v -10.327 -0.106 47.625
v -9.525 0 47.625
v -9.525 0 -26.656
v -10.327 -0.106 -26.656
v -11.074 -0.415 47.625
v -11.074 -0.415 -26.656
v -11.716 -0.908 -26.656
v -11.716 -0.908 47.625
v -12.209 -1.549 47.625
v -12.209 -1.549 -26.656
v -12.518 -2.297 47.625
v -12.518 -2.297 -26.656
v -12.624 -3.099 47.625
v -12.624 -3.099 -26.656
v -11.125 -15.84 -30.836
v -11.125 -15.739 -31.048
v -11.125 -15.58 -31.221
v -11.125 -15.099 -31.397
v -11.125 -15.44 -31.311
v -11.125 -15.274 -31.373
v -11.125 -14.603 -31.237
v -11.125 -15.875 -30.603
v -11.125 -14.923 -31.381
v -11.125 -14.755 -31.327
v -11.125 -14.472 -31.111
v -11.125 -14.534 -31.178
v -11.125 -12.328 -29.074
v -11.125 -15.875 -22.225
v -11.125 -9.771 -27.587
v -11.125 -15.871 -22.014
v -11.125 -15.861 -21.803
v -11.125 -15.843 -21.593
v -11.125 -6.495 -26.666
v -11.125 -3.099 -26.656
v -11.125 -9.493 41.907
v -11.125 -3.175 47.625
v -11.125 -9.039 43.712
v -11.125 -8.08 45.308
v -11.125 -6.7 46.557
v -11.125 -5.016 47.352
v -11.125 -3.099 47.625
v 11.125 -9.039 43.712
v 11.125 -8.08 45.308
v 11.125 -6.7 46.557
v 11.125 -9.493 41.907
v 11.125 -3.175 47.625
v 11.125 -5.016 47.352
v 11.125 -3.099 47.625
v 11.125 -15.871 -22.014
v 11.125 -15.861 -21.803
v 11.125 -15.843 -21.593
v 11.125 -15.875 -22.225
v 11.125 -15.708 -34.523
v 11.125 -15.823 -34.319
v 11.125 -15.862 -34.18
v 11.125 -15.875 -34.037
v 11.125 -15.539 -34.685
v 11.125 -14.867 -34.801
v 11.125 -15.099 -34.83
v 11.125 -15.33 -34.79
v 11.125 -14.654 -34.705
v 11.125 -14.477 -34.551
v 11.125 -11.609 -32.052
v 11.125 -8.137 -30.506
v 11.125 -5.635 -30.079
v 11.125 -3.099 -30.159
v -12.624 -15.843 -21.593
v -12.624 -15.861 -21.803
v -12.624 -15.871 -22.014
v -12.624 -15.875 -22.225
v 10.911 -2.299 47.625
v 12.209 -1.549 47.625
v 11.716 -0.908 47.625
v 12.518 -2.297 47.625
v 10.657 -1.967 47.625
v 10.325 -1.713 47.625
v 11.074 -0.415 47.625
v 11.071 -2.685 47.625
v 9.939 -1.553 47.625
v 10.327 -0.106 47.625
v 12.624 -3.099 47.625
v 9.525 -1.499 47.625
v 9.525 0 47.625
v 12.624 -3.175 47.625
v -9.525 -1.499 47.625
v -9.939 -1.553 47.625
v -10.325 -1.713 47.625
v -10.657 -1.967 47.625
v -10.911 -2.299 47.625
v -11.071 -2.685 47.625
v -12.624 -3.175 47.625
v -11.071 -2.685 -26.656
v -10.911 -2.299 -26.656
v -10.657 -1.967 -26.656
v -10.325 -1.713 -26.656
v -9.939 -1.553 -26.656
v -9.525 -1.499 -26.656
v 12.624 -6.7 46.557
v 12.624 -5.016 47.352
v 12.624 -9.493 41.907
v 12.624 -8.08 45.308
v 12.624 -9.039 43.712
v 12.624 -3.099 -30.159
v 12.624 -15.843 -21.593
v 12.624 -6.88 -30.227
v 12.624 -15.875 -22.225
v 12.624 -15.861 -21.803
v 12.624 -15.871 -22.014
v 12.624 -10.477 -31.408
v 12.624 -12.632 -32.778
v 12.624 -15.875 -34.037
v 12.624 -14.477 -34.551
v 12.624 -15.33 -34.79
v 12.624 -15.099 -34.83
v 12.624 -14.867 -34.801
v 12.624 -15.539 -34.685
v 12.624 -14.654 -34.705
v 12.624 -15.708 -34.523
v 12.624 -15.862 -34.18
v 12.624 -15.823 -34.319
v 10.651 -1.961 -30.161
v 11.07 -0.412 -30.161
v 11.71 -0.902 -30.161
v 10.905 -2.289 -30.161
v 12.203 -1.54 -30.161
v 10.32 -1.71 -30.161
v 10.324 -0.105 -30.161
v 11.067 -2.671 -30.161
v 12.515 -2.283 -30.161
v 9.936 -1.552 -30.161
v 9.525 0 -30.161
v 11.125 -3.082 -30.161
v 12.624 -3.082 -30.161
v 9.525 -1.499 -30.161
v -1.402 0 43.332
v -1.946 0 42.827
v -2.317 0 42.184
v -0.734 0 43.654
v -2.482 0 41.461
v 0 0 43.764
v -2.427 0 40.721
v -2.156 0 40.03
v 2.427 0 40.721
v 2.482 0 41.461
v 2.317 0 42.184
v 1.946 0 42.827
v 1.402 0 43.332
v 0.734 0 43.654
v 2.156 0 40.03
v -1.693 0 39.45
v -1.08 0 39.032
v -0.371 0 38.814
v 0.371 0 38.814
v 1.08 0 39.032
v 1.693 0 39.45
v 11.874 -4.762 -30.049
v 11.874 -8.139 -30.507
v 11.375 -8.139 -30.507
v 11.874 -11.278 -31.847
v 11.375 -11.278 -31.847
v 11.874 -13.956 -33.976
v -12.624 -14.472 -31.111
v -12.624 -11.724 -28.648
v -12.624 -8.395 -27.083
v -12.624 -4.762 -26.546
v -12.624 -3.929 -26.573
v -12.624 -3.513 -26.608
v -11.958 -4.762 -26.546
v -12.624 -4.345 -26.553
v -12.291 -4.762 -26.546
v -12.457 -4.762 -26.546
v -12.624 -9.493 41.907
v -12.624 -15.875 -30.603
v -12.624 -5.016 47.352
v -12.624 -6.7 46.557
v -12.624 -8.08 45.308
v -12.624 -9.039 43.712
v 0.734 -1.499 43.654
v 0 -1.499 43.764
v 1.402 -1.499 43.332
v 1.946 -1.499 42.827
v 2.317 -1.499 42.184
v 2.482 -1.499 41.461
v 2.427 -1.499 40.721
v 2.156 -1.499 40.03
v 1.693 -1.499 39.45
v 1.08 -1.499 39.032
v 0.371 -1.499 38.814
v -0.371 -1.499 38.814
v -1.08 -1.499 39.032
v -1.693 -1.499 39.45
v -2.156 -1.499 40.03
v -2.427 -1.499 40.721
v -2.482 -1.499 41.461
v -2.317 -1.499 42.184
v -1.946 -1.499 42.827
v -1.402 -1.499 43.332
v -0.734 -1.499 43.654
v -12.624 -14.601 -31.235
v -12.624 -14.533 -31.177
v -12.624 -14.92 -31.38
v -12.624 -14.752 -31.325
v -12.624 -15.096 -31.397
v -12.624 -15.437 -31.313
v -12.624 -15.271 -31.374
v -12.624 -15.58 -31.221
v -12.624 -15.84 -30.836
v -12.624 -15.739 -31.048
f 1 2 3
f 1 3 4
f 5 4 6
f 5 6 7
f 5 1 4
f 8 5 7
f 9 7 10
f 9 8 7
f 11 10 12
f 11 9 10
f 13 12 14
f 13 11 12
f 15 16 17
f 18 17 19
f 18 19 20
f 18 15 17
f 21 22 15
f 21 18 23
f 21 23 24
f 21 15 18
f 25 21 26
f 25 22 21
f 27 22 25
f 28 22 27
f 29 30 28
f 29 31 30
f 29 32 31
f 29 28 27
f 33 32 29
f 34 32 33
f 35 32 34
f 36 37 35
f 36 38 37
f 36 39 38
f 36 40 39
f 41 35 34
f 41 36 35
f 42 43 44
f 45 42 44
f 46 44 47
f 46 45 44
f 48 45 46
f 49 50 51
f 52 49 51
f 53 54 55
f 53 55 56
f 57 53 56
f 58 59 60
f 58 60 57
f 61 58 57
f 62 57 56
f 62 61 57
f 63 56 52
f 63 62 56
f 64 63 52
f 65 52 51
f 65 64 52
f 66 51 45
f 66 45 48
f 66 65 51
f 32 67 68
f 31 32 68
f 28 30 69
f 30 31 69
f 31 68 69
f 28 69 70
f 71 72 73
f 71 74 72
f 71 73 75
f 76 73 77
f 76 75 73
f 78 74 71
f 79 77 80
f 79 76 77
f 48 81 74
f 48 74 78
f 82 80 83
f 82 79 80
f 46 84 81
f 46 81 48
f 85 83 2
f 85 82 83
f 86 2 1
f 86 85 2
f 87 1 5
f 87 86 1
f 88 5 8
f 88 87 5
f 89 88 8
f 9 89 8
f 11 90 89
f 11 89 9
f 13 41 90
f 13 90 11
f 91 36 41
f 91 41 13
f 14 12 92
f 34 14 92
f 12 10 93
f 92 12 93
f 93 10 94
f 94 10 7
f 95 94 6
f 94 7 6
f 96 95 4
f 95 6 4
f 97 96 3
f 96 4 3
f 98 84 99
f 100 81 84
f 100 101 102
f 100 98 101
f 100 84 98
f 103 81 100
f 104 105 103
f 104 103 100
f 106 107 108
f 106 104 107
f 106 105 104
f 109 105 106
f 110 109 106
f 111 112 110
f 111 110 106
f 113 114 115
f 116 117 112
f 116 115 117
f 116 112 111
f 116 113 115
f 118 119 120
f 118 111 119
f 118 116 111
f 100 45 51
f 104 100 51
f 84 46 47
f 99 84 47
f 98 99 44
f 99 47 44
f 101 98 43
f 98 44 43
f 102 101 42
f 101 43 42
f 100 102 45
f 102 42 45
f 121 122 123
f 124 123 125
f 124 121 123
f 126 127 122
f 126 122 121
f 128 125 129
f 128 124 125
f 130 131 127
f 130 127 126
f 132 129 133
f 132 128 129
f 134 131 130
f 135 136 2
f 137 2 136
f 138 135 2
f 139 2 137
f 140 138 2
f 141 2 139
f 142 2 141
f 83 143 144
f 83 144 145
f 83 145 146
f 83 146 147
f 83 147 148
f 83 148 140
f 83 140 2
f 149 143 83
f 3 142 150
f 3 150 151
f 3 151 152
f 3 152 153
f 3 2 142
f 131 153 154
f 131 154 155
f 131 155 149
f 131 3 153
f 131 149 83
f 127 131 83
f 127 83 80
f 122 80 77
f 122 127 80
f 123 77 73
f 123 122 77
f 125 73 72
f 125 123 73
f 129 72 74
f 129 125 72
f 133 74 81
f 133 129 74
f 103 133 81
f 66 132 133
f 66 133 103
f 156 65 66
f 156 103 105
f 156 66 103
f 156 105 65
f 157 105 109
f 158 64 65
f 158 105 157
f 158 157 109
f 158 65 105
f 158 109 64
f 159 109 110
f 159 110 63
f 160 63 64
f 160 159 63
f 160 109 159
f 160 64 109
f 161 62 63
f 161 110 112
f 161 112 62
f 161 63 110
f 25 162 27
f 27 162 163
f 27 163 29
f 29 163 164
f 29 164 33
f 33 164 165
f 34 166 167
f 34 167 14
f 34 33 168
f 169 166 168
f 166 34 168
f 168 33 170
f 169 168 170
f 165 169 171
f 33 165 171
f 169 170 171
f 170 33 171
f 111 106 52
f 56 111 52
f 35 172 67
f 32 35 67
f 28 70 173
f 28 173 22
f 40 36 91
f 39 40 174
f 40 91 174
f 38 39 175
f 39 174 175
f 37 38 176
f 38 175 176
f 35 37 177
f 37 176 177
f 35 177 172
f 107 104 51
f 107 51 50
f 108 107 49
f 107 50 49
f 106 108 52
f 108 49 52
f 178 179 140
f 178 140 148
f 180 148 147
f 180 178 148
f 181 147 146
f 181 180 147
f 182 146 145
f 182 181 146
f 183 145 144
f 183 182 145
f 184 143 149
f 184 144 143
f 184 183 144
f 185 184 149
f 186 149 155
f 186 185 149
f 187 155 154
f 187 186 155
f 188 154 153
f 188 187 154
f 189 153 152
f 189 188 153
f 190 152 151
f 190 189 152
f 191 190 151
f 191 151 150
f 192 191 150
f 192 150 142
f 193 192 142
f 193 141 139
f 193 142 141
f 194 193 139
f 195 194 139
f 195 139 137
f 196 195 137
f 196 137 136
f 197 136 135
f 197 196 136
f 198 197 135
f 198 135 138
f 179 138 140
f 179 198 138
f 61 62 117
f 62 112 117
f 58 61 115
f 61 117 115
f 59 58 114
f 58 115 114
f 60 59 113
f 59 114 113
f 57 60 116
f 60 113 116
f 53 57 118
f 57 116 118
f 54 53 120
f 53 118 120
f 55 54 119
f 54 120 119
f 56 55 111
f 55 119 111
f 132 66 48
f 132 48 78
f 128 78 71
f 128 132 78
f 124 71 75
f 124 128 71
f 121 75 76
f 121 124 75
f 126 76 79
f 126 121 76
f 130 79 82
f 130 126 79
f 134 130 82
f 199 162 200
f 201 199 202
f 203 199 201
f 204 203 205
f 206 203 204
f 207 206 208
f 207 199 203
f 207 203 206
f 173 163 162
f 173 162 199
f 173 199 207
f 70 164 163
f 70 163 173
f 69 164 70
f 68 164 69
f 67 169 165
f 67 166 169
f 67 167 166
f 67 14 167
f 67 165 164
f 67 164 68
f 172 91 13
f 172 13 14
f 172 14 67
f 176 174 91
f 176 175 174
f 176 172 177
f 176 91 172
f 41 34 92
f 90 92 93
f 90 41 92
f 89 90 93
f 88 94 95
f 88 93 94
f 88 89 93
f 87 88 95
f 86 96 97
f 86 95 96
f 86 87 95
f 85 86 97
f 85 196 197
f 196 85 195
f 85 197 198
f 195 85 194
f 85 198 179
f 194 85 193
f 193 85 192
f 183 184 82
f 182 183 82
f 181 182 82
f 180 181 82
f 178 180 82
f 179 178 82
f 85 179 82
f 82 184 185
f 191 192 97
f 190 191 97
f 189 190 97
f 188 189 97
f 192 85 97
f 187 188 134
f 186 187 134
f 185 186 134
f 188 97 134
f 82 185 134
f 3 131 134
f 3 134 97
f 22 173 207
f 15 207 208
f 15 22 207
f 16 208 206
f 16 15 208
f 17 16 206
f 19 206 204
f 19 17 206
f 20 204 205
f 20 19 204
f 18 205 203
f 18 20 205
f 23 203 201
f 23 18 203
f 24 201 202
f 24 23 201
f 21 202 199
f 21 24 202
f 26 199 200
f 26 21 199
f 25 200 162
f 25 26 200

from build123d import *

# Parameters (mm, degrees)
BASE_FLANGE1_START      = -1.4986
BASE_FLANGE1_OUTLINE_W  = 19.05
BASE_FLANGE1_OUTLINE_H  = 95.25
BASE_FLANGE1_DEPTH      = 1.4986
EDGE_FLANGE2_DEPTH      = 95.25
EDGE_FLANGE2_BEND_DEPTH = 95.25
CUT_EXTRUDE2_DEPTH      = 52.76404714123502
CUT_EXTRUDE2_DEPTH_BACK = 52.76404714123502
SKETCH22_R              = 2.4892000000000007
SURFACECUT1_START       = -8.467465696
SURFACECUT1_DEPTH       = 28.142997323
CUT_EXTRUDE5_START      = -7.730915537
CUT_EXTRUDE5_DEPTH      = 7.730915537
CUT_EXTRUDE6_DEPTH      = 3.0988
CUT_EXTRUDE7_DEPTH      = 3.0988
CUT_EXTRUDE3_DEPTH      = 57.19250460256741
FILLET1_R               = 0.79375


# Read off the part's stored shape, not the designer's step: Base-Flange1, SurfaceCut1, Cut-Extrude5
# Sheet-metal steps are written as plain solids
with BuildPart() as part:
    # Base-Flange1 outline → Base-Flange1 (new body)
    with BuildSketch(Plane(origin=(0, 0, 0), x_dir=(1, 0, 0), z_dir=(0, 1, 0)).offset(BASE_FLANGE1_START)):
        Rectangle(BASE_FLANGE1_OUTLINE_W, BASE_FLANGE1_OUTLINE_H)
    extrude(amount=BASE_FLANGE1_DEPTH)

    # Edge-Flange2 section (across the edge) → Edge-Flange2 (add)
    with BuildSketch(Plane(origin=(11.125200000000007, -1.4985999999999888, -47.625), x_dir=(-1, -3.49e-15, 0), z_dir=(0, 0, 1))):
        with BuildLine():
            Line((-1.4985999999999997, 1.6002000000000056), (-1.4985999999999997, 14.3764))
            Line((-1.4985999999999997, 14.3764), (0, 14.3764))
            Line((0, 14.3764), (0, 1.6002000000000056))
            ThreePointArc((0, 1.6002000000000056), (0.46868772874528863, 0.4686877287452902), (1.6002000000000056, 5.55e-15))
            Line((1.6002000000000056, 5.55e-15), (1.600200000000011, -1.4985999999999942))
            ThreePointArc((1.600200000000011, -1.4985999999999942), (-0.5909824935408694, -0.5909824935408718), (-1.4985999999999997, 1.6002000000000056))
        make_face()
    extrude(amount=EDGE_FLANGE2_DEPTH)

    # Edge-Flange2 section 2 (across the edge) → Edge-Flange2 bend (add)
    with BuildSketch(Plane(origin=(-11.125200000000007, -1.4985999999999888, 47.625), x_dir=(1, -3.49e-15, 0), z_dir=(0, 0, -1))):
        with BuildLine():
            Line((-1.4985999999999997, 1.6002000000000056), (-1.4985999999999997, 14.3764))
            Line((-1.4985999999999997, 14.3764), (0, 14.3764))
            Line((0, 14.3764), (0, 1.6002000000000056))
            ThreePointArc((0, 1.6002000000000056), (0.46868772874528863, 0.4686877287452902), (1.6002000000000056, 5.55e-15))
            Line((1.6002000000000056, 5.55e-15), (1.600200000000011, -1.4985999999999942))
            ThreePointArc((1.600200000000011, -1.4985999999999942), (-0.5909824935408694, -0.5909824935408718), (-1.4985999999999997, 1.6002000000000056))
        make_face()
    extrude(amount=EDGE_FLANGE2_BEND_DEPTH)

    # Sketch22 → Cut-Extrude2 (cut, two sides: drawn at the far end of the back side and taken through both)
    with BuildSketch(Plane(origin=(0, 0, 0), x_dir=(1, 0, 0), z_dir=(0, 1, 0)).offset(-CUT_EXTRUDE2_DEPTH_BACK)):
        with Locations(Location((0, -41.275, 0), (0, 0, 270))):
            Circle(SKETCH22_R)
    extrude(amount=CUT_EXTRUDE2_DEPTH + CUT_EXTRUDE2_DEPTH_BACK, mode=Mode.SUBTRACT)

    # SurfaceCut1 outline → SurfaceCut1 (cut)
    with BuildSketch(Plane(origin=(0, 0, 0), x_dir=(0, 1, 0), z_dir=(0.9885166943248128, 0, -0.15111169723467696)).offset(SURFACECUT1_START)):
        with BuildLine():
            ThreePointArc((-4.7625, -28.14850854), (-11.21253157, -29.908348909), (-15.875, -34.700147478))
            Line((-15.875, -34.700147478), (-15.875, -45.396959713))
            Line((-15.875, -45.396959713), (-15.875, -48.985711411))
            Line((-15.875, -48.985711411), (-15.875, -50))
            Line((-15.875, -50), (-1.4986, -50))
            Line((-1.4986, -50), (-1.4986, -48.517446483))
            Line((-1.4986, -48.517446483), (-1.4986, -28.575083721))
            ThreePointArc((-1.4986, -28.575083721), (-3.116671212, -28.255603887), (-4.7625, -28.14850854))
        make_face()
        with BuildLine():
            ThreePointArc((4.904e-06, -29.075295425), (-0.741511706, -28.801863648), (-1.4986, -28.575083721))
            Line((-1.4986, -28.575083721), (-1.4986, -48.517446483))
            Line((-1.4986, -48.517446483), (-1.4986, -50))
            Line((-1.4986, -50), (0, -50))
            Line((0, -50), (0, -48.517446483))
            Line((0, -48.517446483), (4.904e-06, -29.075295425))
        make_face()
    extrude(amount=SURFACECUT1_DEPTH, mode=Mode.SUBTRACT)

    # Cut-Extrude5 outline → Cut-Extrude5 (cut)
    with BuildSketch(Plane(origin=(12.623799999999989, 4.417e-14, 0), x_dir=(0, 0, -1), z_dir=(1, 3.5e-15, 0)).offset(CUT_EXTRUDE5_START)):
        with BuildLine():
            Line((30.161013656, 0), (30.161013656, -3.081973107))
            add(Edge.make_bspline(
                [(30.161013656, -3.081973107), (30.123789076338376, -3.3604465015117064), (30.06785145291286, -3.91981299251284), (30.04917867771754, -4.481604272315385), (30.049178677717507, -5.901493089885278), (30.203533924549607, -7.040390278974325), (30.810097482517182, -9.23799149755241), (31.262254102606217, -10.296510885520753), (32.43252435045563, -12.258659918928036), (33.15053883450323, -13.162125608464567), (34.747119867091556, -14.697775892591103), (35.61176103928939, -15.343862250932757), (36.543461511, -15.875)],
                knots=[7.01e-15, 7.01e-15, 7.01e-15, 7.01e-15, 0.49999999999999956, 1.0000000000000067, 1.0000000000000067, 3.0274304263670744, 3.0274304263670744, 5.054860852734149, 5.054860852734149, 7.082291279101224, 7.082291279101224, 8.9752750105383, 8.9752750105383, 8.9752750105383, 8.9752750105383], degree=3))
            Line((36.543461511, -15.875), (37.033012726, -15.875))
            Line((37.033012726, -15.875), (37.033012726, 0))
            Line((37.033012726, 0), (30.161013656, 0))
        make_face()
    extrude(amount=CUT_EXTRUDE5_DEPTH, mode=Mode.SUBTRACT)

    # Sketch45 → Cut-Extrude6 (cut)
    with BuildSketch(Plane.ZY.offset(12.623799999999989)):
        with BuildLine():
            Line((-27.956993224305993, -3.333e-14), (-30.16101365632842, 9.1e-16))
            Line((-30.16101365632842, 9.1e-16), (-36.543461511337, -8e-16))
            Line((-36.543461511337, -8e-16), (-36.543461511337, -15.874999999986066))
            Line((-36.543461511337, -15.874999999986066), (-33.17348490156023, -15.875000000001156))
            add(Edge.make_bspline(
                [(-33.17348490156023, -15.875000000001156), (-26.545737514477914, -12.250087357596882), (-26.545737514477917, -4.762499999999605)],
                knots=[5.217749490668621, 5.217749490668621, 5.217749490668621, 6.283185307179613, 6.283185307179613, 6.283185307179613], degree=2, weights=[1, 0.8614298921780303, 1]))
            add(Edge.make_bspline(
                [(-26.545737514477917, -4.762499999999605), (-26.54573751447792, -3.9270502006252928), (-26.65645281584444, -3.098800000000031)],
                knots=[2.713e-14, 2.713e-14, 2.713e-14, 0.13137760520102773, 0.13137760520102773, 0.13137760520102773], degree=2, weights=[1, 0.9978432663026745, 1]))
            add(Edge.make_bspline(
                [(-26.65645281584444, -3.098800000000031), (-26.684580856749765, -2.888376912716788), (-26.720679971169147, -2.6830962290480005), (-26.807185378421263, -2.2819272788971268), (-26.85827209747719, -2.08400579105707), (-26.969891004260706, -1.7101957732584916), (-27.030292368751276, -1.5339055104769577), (-27.157879164314696, -1.2013029710556327), (-27.22503599588623, -1.045497343577505), (-27.358398930056477, -0.7651263937563396), (-27.425255566221505, -0.6388233840907098), (-27.556567938722992, -0.41451622077370254), (-27.61948989121088, -0.31919542751514146), (-27.793980163734616, -0.08637757170014503), (-27.892843777023433, -3.459e-14), (-27.956993224305993, -3.333e-14)],
                knots=[0, 0, 0, 0, 0.1249999999999998, 0.1249999999999998, 0.2499999999999996, 0.2499999999999996, 0.37499999999999944, 0.37499999999999944, 0.4999999999999992, 0.4999999999999992, 0.624999999999999, 0.624999999999999, 0.7499999999999989, 0.7499999999999989, 1, 1, 1, 1], degree=3))
        make_face()
    extrude(amount=-CUT_EXTRUDE6_DEPTH, mode=Mode.SUBTRACT)

    # Sketch46 → Cut-Extrude7 (cut)
    with BuildSketch(Plane(origin=(0, 0, 0), x_dir=(1, 0, 0), z_dir=(0, 1, 0))):
        Polygon((-11.125200000000001, 26.65645281584444), (-12.623800000000001, 26.65645281584444), (-12.623800000000044, 30.161013656328407), (9.52499999999999, 30.16101365632841), (-9.525, 26.65645281584444), align=None)
    extrude(amount=-CUT_EXTRUDE7_DEPTH, mode=Mode.SUBTRACT)

    # Sketch36 → Cut-Extrude3 (cut, through all)
    with BuildSketch(Plane.ZY.offset(12.623799999999989)):
        with BuildLine():
            Line((41.90684861578345, -9.493486157833454), (-21.593151384216544, -15.84348615783458))
            ThreePointArc((-21.593151384216544, -15.84348615783458), (-21.908682993060925, -15.867116645973631), (-22.224999999999994, -15.875000000001158))
            Line((-22.224999999999994, -15.875000000001158), (47.625, -15.875000000000039))
            Line((47.625, -15.875000000000039), (47.62499999999999, -3.1750000000000345))
            ThreePointArc((47.62499999999999, -3.1750000000000345), (45.98322358805446, -7.435883786831999), (41.90684861578345, -9.493486157833454))
        make_face()
    extrude(amount=-CUT_EXTRUDE3_DEPTH, mode=Mode.SUBTRACT)

    # Fillet1
    fillet1_edges = [part.edges().sort_by_distance(p)[0] for p in [
        (11.874500000000051, -15.874999999999957, -36.543461511),
        (-11.874500000000051, -15.875000000001114, -33.17348490156023),
    ]]
    fillet(fillet1_edges, radius=FILLET1_R)


solid = part.part
